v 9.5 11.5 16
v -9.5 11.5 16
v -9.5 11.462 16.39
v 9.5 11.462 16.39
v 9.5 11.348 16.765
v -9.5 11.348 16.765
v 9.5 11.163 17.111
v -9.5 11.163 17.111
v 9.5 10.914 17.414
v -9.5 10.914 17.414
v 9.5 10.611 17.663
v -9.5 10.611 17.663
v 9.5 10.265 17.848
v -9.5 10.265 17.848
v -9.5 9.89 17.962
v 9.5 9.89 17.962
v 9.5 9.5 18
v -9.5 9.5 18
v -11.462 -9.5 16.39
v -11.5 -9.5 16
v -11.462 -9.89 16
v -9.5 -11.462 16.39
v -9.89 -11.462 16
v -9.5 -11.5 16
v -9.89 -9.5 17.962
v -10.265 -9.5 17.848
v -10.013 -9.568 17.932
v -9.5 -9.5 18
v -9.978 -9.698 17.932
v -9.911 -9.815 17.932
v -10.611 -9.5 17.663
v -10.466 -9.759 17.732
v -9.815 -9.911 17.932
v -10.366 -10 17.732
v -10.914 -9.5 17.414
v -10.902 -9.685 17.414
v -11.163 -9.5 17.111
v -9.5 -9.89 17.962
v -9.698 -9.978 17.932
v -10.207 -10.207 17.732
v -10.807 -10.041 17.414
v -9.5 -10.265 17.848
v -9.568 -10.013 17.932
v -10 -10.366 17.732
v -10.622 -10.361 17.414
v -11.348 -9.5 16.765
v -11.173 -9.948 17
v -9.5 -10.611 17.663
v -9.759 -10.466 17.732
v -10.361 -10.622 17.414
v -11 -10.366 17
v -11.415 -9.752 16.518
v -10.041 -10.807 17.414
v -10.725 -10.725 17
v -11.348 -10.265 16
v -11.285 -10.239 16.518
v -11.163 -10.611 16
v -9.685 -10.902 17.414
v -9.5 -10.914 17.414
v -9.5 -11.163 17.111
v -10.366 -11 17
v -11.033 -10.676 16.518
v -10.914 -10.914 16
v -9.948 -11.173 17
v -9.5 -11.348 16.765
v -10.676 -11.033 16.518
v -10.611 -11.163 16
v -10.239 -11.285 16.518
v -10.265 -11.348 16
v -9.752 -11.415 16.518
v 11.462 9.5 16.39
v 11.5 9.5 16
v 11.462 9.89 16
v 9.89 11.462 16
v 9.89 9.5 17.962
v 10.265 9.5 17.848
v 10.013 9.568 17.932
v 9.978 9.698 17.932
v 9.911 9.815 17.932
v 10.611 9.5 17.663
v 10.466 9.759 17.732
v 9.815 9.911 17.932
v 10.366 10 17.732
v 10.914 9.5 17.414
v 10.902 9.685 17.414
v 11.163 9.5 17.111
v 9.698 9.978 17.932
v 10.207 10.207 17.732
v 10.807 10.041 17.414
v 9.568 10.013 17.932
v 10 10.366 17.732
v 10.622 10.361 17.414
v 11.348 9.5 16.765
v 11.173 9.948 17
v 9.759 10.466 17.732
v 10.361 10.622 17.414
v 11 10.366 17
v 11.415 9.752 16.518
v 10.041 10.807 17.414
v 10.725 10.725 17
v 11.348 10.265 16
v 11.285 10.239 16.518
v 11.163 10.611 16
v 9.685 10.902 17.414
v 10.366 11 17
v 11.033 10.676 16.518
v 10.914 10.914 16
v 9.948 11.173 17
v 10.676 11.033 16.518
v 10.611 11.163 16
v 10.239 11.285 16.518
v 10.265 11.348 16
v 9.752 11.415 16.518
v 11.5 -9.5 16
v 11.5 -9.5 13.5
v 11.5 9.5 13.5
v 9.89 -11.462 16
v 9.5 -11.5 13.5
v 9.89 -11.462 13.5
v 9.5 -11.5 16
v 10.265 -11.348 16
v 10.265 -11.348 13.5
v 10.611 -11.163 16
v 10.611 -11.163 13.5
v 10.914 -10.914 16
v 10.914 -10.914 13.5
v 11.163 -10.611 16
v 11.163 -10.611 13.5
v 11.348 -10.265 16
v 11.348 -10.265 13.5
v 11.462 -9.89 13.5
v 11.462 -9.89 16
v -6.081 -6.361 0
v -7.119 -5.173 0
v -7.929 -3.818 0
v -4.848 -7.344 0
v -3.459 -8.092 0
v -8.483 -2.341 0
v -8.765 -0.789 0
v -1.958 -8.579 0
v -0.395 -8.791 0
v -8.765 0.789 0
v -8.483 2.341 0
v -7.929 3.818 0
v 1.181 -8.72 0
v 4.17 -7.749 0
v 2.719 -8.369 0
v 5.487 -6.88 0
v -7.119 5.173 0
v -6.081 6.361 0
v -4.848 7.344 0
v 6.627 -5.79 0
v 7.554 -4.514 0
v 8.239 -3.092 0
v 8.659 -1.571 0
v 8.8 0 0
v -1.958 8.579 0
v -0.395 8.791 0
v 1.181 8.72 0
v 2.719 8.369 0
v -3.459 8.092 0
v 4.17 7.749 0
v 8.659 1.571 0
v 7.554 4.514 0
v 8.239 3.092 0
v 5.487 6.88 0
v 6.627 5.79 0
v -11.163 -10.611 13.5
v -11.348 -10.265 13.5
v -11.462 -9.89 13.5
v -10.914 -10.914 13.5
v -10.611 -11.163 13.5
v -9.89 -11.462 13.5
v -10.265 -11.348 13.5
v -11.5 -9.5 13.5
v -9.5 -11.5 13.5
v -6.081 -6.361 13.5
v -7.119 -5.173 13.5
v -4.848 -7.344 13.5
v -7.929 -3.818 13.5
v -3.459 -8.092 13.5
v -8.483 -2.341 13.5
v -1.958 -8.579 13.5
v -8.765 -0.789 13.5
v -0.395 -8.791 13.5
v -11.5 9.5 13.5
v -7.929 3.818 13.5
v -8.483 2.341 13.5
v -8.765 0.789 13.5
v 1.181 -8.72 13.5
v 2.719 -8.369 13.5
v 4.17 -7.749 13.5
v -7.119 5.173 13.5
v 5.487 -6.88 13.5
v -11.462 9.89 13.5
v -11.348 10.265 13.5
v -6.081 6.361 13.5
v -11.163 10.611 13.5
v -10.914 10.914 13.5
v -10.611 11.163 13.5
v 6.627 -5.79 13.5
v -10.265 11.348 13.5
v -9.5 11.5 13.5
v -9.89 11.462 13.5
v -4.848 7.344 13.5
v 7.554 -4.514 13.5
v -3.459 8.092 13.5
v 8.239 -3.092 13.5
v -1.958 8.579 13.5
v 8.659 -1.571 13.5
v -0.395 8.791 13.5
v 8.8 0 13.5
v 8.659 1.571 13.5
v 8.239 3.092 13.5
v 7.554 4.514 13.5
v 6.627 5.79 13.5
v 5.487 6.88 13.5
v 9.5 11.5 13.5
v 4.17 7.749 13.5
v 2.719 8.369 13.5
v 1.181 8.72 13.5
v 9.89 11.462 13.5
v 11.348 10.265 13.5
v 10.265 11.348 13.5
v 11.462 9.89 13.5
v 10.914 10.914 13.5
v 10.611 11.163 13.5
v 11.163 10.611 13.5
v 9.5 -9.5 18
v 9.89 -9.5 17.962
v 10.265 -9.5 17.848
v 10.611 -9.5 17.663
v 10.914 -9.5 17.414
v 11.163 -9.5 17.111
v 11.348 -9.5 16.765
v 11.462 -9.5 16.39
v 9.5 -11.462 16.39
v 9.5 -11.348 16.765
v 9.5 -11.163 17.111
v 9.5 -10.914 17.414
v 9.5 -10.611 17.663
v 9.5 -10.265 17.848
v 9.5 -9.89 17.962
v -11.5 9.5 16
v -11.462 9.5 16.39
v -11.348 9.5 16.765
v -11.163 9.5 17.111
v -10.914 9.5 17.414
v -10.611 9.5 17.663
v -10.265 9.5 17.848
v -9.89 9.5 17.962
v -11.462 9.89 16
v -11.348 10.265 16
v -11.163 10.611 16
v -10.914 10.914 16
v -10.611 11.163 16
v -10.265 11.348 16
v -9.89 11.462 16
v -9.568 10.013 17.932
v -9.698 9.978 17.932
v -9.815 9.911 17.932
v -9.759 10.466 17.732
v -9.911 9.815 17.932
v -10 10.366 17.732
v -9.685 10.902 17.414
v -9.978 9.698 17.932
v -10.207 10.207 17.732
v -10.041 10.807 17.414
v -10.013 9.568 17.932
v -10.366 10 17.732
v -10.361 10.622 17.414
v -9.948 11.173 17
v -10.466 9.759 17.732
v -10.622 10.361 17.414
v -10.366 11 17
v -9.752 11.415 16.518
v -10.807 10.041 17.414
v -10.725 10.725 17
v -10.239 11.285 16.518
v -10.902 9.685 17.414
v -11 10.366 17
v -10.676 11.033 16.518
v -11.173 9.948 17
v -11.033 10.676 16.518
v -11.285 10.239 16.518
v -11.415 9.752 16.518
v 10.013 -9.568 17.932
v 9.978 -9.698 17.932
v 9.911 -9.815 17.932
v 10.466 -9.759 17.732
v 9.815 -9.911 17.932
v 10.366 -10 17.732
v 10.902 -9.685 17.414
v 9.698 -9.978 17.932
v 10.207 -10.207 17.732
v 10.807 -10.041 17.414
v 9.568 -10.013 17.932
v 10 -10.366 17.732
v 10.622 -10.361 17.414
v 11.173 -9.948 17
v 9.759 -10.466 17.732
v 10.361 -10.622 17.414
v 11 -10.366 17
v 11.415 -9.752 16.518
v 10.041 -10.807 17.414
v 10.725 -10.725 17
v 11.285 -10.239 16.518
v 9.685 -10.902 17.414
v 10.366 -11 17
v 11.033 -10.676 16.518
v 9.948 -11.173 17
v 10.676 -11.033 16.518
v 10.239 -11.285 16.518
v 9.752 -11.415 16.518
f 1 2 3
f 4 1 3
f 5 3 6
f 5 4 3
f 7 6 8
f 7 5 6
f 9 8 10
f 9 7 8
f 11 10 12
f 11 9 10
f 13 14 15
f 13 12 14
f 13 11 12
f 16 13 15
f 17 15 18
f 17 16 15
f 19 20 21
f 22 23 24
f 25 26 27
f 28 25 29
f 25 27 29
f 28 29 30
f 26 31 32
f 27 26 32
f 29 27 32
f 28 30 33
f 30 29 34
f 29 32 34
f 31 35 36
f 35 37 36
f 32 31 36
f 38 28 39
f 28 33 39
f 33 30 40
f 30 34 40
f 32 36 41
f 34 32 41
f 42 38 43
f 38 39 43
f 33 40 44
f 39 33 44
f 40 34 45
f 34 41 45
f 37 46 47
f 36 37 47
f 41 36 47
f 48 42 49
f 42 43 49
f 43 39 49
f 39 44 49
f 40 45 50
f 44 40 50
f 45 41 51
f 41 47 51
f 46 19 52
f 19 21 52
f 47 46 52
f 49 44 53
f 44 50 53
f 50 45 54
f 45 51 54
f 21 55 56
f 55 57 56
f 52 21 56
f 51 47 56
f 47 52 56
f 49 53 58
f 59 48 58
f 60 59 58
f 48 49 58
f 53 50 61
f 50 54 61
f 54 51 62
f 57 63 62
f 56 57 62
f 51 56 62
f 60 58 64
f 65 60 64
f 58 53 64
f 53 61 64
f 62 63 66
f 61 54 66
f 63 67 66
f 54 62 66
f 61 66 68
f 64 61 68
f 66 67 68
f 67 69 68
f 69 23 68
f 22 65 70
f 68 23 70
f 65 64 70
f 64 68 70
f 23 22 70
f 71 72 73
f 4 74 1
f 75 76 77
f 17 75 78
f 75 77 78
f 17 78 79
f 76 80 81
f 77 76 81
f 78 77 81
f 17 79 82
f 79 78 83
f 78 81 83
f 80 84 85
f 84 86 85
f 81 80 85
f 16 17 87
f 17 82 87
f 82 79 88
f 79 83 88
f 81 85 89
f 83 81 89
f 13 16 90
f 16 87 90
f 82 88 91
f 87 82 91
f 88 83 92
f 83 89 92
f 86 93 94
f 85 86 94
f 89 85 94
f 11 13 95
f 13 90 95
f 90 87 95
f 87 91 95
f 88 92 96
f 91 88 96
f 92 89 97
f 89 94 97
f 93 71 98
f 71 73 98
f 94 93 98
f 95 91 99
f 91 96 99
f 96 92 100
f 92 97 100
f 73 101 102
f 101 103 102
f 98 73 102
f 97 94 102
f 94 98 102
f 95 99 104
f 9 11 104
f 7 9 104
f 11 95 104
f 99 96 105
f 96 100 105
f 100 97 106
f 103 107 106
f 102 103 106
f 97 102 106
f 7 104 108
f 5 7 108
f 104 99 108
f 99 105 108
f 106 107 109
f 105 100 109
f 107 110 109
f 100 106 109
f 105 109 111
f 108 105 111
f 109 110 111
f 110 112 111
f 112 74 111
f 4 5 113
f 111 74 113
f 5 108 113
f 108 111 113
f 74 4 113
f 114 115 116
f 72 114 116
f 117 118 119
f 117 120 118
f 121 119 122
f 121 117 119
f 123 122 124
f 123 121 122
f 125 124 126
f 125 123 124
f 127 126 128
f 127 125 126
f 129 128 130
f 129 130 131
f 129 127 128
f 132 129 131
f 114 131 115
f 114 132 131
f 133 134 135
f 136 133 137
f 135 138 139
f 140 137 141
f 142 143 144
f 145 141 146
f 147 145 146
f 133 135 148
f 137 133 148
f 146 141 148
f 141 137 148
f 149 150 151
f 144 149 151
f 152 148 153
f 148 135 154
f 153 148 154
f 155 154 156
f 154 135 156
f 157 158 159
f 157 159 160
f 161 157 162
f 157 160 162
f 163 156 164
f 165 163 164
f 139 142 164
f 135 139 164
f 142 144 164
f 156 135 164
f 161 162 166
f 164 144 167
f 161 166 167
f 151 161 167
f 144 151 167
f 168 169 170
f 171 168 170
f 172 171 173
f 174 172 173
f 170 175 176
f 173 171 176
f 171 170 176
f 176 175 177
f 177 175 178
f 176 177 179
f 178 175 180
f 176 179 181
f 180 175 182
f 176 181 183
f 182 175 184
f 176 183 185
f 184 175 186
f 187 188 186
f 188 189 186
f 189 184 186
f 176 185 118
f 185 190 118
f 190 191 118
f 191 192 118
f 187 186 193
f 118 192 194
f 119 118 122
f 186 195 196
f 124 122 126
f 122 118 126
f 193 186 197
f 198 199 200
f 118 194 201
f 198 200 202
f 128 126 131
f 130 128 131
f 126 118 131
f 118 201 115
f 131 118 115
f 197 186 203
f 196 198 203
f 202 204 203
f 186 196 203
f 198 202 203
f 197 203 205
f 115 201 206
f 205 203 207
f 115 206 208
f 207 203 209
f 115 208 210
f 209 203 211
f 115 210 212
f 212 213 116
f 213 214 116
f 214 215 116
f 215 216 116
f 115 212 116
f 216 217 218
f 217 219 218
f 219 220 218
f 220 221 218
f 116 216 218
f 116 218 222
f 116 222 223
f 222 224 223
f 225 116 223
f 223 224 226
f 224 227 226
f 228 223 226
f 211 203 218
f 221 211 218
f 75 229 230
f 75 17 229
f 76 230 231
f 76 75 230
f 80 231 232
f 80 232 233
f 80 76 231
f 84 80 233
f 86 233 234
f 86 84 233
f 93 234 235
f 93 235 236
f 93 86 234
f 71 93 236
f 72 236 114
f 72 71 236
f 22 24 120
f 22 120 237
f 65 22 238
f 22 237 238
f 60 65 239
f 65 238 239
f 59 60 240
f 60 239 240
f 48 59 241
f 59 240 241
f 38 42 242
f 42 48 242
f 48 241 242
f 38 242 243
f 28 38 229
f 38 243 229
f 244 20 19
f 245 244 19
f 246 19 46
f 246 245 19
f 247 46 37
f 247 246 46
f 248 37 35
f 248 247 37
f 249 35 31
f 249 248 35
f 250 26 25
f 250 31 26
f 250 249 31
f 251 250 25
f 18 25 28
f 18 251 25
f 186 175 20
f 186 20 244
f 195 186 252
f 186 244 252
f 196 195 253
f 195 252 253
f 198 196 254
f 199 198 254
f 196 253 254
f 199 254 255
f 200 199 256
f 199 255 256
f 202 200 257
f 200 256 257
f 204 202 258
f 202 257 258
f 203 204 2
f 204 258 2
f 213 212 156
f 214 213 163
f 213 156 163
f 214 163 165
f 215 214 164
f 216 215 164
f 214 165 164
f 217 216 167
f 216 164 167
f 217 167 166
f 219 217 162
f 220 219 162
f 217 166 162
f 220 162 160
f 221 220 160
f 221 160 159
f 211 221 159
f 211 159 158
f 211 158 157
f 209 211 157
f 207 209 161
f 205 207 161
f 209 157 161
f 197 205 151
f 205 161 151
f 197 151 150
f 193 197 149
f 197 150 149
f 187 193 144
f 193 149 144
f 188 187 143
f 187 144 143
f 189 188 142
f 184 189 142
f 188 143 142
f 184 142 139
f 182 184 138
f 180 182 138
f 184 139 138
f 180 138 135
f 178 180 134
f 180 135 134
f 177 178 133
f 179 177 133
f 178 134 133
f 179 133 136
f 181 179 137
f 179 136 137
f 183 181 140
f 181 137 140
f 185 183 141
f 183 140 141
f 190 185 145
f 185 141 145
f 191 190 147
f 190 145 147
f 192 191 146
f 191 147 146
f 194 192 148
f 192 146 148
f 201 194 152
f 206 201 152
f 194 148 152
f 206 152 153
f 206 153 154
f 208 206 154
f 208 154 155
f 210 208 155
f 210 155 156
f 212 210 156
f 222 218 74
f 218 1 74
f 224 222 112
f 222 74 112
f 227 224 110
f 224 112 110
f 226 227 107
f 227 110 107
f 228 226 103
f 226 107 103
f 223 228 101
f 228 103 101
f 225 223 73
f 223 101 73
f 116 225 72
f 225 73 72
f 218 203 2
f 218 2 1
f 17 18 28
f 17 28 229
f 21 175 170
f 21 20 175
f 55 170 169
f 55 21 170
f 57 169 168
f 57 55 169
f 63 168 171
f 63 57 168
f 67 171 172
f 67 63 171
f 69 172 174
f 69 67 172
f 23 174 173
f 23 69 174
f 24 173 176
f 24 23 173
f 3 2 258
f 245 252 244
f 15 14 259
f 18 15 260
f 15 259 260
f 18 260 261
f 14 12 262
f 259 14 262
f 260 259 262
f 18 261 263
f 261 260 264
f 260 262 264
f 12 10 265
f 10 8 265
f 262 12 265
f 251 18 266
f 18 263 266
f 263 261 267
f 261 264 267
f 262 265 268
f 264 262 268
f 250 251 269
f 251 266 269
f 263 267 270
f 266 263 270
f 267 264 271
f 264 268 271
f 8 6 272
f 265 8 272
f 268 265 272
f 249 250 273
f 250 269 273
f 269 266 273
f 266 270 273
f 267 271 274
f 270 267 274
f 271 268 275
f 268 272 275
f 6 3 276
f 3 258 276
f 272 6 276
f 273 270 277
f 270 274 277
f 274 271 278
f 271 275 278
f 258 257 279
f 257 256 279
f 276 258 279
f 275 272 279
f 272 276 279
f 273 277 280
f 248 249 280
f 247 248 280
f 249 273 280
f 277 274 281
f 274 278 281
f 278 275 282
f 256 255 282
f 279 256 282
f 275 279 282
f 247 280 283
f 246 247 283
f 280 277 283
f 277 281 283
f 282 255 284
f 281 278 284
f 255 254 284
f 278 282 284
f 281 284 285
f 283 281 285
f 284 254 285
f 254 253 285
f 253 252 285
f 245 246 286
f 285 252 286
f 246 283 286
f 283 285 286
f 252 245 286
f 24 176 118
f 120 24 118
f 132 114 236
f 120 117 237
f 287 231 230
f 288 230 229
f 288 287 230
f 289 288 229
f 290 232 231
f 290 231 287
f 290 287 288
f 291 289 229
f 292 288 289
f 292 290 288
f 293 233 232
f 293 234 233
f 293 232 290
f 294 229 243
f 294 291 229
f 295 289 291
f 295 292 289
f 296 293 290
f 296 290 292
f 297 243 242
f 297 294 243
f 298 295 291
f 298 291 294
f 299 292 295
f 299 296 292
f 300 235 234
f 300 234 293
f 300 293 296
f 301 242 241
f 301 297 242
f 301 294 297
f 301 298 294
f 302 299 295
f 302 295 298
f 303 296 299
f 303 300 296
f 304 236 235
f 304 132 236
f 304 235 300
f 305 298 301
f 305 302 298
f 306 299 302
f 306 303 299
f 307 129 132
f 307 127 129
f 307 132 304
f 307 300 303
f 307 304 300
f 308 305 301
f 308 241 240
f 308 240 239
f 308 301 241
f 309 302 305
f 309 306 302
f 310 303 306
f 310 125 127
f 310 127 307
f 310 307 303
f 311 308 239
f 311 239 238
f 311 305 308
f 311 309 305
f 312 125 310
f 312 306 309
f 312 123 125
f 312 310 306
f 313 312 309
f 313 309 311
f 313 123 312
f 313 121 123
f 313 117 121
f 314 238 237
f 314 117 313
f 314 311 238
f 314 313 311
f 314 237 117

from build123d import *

# Parameters (mm, degrees)
SKETCH3_R           = 8.8
BOSS_EXTRUDE1_DEPTH = 13.5
SKETCH4_W           = 23
SKETCH4_H           = 23
BOSS_EXTRUDE2_DEPTH = 4.5
FILLET1_R           = 2


with BuildPart() as part:
    # Sketch3 → Boss-Extrude1 (new body)
    with BuildSketch(Plane.XY):
        Circle(SKETCH3_R)
    extrude(amount=BOSS_EXTRUDE1_DEPTH)

    # Sketch4 → Boss-Extrude2 (add)
    with BuildSketch(Plane.XY.offset(13.5)):
        Rectangle(SKETCH4_W, SKETCH4_H)
    extrude(amount=BOSS_EXTRUDE2_DEPTH)

    # Fillet1
    fillet1_edges = [part.edges().sort_by_distance(p)[0] for p in [
        (11.5, -11.5, 15.75),
        (11.5, 11.5, 15.75),
        (-11.5, 11.5, 15.75),
        (-11.5, -11.5, 15.75),
        (11.5, 0, 18),
        (0, 11.5, 18),
        (-11.5, 0, 18),
        (0, -11.5, 18),
    ]]
    fillet(fillet1_edges, radius=FILLET1_R)


solid = part.part
